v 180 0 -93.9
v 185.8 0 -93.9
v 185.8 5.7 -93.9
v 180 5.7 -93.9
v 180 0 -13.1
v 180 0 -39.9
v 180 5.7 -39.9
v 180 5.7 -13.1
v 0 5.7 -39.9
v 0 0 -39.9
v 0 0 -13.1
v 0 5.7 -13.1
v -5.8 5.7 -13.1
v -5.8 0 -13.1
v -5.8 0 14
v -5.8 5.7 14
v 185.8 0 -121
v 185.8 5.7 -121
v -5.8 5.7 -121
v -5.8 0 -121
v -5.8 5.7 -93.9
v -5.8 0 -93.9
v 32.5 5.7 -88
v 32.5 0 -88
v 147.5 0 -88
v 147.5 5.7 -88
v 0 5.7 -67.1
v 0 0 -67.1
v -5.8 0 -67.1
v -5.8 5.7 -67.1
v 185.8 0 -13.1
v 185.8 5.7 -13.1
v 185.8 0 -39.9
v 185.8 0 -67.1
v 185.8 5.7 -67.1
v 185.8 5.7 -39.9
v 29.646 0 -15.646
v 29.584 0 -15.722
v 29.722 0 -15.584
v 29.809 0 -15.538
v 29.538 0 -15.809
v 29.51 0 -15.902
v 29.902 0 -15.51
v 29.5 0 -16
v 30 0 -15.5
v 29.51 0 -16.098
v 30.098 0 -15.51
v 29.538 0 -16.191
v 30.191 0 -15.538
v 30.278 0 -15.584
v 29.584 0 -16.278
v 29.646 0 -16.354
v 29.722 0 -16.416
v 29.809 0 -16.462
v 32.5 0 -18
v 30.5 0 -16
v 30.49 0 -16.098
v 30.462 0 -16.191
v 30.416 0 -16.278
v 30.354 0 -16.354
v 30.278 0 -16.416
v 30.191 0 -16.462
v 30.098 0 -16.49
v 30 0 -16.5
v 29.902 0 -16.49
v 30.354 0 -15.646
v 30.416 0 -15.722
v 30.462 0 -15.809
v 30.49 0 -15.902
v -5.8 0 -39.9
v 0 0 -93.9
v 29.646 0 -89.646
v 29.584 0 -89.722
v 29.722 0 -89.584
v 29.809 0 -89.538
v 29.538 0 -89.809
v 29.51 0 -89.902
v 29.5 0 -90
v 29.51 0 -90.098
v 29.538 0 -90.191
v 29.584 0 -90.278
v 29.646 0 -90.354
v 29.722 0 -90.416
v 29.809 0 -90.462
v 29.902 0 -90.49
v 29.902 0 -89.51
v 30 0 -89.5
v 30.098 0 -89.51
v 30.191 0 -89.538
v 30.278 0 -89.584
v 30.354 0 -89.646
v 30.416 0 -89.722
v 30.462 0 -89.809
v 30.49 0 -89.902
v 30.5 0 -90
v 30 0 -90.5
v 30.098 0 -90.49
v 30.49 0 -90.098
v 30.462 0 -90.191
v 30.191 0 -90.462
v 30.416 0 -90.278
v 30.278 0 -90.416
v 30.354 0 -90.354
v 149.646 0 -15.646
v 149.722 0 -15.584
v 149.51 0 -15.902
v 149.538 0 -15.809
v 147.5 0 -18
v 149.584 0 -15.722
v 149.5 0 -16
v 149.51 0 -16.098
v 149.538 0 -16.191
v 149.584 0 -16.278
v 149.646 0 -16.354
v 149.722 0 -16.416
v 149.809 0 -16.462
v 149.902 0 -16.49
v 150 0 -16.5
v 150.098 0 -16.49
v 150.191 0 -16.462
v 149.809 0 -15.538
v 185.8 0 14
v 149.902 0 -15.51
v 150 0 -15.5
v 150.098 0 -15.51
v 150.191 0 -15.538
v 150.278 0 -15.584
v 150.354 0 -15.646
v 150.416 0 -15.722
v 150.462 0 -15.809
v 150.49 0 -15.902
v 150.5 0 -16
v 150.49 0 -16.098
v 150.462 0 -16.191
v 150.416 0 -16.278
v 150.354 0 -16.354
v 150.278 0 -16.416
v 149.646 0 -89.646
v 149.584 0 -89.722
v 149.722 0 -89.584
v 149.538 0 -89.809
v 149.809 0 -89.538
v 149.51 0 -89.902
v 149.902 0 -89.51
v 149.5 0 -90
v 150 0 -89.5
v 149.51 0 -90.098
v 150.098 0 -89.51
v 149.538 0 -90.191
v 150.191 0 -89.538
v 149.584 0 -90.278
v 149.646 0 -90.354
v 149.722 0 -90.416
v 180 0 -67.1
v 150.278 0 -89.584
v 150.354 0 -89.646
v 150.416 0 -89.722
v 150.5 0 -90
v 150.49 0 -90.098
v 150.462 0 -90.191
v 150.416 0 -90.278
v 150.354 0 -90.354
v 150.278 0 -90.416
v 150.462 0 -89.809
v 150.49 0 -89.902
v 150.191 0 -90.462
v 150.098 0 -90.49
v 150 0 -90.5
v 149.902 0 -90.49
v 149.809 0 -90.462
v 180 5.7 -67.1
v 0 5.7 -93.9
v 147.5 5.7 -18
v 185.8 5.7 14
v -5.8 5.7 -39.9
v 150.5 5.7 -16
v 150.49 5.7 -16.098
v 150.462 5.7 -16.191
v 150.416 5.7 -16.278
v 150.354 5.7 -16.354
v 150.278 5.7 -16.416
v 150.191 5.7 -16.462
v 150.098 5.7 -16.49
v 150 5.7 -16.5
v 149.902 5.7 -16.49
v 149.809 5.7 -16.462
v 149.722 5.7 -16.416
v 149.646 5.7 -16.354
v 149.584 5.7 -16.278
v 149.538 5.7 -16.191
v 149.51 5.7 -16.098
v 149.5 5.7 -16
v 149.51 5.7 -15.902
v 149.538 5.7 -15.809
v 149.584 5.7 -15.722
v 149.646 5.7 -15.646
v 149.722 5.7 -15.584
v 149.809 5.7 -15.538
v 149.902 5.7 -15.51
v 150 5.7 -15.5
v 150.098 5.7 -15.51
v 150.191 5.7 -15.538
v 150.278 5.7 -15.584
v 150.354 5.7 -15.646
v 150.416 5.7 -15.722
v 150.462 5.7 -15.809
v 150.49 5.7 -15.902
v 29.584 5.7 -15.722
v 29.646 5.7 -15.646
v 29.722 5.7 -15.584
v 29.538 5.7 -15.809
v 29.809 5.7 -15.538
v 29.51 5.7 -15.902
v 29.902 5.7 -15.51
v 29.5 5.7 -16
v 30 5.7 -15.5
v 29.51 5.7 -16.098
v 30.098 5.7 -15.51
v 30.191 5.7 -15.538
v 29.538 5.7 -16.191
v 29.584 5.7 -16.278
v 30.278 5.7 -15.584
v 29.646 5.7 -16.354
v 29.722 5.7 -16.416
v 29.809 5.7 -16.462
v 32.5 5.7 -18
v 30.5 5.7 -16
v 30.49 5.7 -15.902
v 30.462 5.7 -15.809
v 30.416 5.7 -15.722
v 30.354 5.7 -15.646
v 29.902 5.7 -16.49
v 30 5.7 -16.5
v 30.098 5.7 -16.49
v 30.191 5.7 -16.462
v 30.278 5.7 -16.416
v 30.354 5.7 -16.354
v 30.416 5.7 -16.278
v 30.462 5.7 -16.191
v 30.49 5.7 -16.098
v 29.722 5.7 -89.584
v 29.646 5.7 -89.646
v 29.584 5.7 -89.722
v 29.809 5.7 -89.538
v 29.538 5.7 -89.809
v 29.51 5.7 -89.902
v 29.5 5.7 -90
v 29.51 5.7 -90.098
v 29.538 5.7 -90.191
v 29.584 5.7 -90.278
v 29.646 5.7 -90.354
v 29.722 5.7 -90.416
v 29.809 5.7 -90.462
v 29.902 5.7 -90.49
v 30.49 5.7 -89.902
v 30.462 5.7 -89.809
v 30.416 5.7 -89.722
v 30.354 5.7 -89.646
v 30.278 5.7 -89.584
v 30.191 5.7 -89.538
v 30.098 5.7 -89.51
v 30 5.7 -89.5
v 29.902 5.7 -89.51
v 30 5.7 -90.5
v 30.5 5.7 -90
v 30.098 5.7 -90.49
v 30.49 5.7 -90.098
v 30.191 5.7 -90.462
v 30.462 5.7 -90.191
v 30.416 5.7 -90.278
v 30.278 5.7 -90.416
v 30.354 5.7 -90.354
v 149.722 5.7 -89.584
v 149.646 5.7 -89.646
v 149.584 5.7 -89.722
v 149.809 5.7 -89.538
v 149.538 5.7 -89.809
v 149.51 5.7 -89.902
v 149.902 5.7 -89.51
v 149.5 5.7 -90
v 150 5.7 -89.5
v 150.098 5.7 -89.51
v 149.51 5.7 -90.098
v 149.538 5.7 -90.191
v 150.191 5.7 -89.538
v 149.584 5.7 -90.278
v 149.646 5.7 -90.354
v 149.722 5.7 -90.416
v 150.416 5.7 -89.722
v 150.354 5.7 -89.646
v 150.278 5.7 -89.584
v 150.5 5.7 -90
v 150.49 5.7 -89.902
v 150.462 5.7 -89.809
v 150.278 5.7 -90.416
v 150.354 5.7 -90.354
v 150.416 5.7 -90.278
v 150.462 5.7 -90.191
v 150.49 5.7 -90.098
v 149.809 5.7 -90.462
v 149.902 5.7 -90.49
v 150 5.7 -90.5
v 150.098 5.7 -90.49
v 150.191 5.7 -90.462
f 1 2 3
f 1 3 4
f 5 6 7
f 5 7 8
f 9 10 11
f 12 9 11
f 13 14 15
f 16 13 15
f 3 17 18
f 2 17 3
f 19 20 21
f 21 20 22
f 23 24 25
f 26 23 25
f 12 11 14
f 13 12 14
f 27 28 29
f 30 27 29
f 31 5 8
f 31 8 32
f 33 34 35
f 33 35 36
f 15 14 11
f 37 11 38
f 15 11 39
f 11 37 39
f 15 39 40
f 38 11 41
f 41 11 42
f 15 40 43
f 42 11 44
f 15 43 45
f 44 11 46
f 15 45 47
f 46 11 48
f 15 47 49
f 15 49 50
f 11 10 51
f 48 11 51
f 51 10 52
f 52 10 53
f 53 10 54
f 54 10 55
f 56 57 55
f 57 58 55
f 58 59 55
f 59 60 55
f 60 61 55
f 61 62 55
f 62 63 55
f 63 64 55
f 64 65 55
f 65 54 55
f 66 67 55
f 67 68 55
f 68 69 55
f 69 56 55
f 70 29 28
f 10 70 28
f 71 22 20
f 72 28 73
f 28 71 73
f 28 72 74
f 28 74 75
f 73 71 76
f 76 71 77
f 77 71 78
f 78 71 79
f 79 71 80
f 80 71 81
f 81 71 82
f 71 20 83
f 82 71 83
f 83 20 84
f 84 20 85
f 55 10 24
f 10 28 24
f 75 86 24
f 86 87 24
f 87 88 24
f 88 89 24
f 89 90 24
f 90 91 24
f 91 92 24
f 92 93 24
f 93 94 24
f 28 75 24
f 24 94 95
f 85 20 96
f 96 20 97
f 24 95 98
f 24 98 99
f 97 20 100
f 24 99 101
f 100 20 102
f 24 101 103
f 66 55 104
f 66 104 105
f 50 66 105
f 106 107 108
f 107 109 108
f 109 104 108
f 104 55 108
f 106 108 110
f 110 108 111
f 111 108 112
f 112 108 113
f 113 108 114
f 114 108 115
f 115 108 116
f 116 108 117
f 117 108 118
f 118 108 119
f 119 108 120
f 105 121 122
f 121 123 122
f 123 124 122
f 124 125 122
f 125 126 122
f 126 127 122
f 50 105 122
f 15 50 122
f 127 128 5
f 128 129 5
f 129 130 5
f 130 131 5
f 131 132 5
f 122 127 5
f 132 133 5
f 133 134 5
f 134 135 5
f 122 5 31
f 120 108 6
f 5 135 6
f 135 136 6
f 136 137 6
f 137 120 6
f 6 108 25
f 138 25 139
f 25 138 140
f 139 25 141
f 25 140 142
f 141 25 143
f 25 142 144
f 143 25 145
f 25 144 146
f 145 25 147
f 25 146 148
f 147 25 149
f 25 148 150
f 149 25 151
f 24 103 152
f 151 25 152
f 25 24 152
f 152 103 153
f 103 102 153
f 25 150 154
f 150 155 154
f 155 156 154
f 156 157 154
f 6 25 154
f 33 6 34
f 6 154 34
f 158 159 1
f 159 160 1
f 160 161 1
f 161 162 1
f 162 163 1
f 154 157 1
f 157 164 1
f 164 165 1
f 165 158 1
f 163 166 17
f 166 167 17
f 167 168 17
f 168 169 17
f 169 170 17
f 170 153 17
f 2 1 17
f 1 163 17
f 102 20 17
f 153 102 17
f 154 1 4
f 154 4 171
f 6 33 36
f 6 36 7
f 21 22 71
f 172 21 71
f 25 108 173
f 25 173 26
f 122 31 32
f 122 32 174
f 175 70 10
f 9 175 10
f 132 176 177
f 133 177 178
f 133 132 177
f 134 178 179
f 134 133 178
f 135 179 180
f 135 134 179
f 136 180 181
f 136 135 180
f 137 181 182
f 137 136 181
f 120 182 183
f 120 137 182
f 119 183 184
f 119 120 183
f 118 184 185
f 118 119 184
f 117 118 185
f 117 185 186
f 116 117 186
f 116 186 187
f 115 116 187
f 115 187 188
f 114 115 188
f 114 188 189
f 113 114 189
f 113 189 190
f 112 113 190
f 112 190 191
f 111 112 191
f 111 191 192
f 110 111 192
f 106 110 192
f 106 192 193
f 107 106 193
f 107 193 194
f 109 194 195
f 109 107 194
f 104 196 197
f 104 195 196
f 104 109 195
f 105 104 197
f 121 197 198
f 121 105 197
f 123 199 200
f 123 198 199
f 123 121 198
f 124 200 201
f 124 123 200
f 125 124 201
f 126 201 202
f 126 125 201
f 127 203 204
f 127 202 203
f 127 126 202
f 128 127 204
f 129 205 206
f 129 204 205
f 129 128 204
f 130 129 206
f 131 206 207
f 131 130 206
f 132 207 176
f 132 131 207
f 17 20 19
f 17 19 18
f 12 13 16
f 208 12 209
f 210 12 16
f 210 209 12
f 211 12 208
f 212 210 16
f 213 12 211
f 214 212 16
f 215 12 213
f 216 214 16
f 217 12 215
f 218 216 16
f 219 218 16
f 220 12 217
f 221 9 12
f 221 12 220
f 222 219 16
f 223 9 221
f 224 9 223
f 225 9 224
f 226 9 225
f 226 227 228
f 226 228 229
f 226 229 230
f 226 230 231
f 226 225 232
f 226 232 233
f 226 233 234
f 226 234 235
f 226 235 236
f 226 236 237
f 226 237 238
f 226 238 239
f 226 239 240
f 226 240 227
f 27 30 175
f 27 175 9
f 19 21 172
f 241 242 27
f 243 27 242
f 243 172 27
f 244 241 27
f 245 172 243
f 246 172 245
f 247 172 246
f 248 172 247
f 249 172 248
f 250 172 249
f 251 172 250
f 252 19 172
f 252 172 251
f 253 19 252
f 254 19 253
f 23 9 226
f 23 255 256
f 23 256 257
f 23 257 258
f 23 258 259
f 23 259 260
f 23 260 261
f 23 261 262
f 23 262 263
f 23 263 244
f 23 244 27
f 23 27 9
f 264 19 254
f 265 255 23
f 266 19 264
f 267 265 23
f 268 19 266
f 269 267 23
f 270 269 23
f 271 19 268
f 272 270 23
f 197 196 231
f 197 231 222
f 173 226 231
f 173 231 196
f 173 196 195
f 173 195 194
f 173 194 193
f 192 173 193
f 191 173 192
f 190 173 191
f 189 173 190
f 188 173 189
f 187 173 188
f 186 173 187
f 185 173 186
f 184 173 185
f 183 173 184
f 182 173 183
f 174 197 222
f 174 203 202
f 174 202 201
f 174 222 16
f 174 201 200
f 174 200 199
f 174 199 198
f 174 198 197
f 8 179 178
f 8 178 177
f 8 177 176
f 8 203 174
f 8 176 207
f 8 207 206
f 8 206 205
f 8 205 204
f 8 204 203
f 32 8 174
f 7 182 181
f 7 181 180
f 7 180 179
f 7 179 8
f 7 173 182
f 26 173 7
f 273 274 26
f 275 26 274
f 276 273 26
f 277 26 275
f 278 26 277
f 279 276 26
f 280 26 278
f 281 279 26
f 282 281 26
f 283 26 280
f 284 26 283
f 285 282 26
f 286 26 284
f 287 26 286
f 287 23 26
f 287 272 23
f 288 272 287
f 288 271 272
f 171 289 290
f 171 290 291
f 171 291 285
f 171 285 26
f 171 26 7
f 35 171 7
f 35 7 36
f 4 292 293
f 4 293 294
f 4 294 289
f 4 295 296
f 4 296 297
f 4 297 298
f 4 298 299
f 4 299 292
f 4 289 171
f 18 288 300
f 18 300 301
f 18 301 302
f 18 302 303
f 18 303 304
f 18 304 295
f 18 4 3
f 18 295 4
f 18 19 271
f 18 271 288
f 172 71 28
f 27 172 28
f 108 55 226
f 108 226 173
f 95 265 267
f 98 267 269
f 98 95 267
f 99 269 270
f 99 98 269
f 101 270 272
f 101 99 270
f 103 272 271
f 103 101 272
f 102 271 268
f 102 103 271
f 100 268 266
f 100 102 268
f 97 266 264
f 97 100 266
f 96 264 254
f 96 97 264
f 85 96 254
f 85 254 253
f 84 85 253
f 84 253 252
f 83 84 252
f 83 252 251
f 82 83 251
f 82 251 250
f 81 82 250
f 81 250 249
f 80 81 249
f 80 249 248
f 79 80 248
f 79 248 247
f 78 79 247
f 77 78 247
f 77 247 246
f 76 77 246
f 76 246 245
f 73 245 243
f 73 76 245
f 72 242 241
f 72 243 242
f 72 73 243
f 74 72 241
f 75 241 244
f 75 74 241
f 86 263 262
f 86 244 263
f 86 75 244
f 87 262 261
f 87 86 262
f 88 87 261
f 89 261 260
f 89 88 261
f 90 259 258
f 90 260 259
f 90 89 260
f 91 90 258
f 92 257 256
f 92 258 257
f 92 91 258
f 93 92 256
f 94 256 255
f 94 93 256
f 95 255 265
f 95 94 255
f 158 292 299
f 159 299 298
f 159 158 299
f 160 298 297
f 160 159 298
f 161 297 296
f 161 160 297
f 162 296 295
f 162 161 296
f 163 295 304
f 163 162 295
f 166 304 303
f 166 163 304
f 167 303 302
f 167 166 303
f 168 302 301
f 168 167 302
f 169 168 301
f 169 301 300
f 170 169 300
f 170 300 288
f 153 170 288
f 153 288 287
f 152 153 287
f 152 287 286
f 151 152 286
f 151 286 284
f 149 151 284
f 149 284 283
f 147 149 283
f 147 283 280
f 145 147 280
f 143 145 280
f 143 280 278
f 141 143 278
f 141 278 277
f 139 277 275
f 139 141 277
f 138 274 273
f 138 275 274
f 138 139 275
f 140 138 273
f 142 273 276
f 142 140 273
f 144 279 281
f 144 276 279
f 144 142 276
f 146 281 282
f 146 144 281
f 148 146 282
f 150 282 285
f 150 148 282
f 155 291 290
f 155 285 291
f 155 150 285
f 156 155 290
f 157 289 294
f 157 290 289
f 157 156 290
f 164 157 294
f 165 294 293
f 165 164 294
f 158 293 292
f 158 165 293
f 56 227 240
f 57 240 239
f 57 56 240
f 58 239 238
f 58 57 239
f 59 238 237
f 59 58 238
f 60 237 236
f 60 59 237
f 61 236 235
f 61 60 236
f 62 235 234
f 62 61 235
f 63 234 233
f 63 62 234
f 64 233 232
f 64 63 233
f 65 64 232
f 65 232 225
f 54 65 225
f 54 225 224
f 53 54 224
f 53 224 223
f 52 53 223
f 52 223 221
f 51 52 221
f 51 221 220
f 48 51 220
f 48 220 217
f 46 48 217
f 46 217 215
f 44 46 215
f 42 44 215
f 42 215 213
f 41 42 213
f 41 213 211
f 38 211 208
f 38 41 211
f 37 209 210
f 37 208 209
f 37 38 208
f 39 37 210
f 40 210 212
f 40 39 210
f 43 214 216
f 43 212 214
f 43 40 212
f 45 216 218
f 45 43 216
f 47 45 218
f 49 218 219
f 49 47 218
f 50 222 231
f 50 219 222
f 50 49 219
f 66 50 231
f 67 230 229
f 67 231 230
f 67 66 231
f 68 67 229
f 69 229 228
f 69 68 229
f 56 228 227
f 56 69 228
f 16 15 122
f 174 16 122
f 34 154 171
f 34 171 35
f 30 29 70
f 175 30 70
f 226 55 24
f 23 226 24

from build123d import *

# Parameters (mm, degrees)
SKETCH3_W           = 192
SKETCH3_H           = 135
BOSS_EXTRUDE1_DEPTH = 5.7
SKETCH9_W           = 115
SKETCH9_H           = 70
CUT_EXTRUDE2_DEPTH  = 47
SKETCH12_R          = 0.5
CUT_EXTRUDE3_DEPTH  = 37
CUT_EXTRUDE4_DEPTH  = 11


with BuildPart() as part:
    # Sketch3 → Boss-Extrude1 (new body)
    with BuildSketch(Plane(origin=(0, 0, 0), x_dir=(1, 0, 0), z_dir=(0, 1, 0))):
        with Locations((90, 53.5)):
            Rectangle(SKETCH3_W, SKETCH3_H)
    extrude(amount=BOSS_EXTRUDE1_DEPTH)

    # Sketch9 → Cut-Extrude2 (cut)
    with BuildSketch(Plane(origin=(0, 0, 0), x_dir=(1, 0, 0), z_dir=(0, 1, 0))):
        with Locations((90, 53)):
            Rectangle(SKETCH9_W, SKETCH9_H)
    extrude(amount=CUT_EXTRUDE2_DEPTH, mode=Mode.SUBTRACT)

    # Sketch12 → Cut-Extrude3 (cut)
    with BuildSketch(Plane(origin=(0, 0, 0), x_dir=(1, 0, 0), z_dir=(0, 1, 0))):
        with Locations((30, 90)):
            Circle(SKETCH12_R)
        with Locations((30, 16)):
            Circle(SKETCH12_R)
        with Locations((150, 16)):
            Circle(SKETCH12_R)
        with Locations((150, 90)):
            Circle(SKETCH12_R)
    extrude(amount=CUT_EXTRUDE3_DEPTH, mode=Mode.SUBTRACT)

    # Sketch13 → Cut-Extrude4 (cut)
    with BuildSketch(Plane(origin=(0, 0, 0), x_dir=(1, 0, 0), z_dir=(0, 1, 0))):
        Polygon((-5.8, 121), (-5.8, 93.9), (0, 93.9), (0, 67.1), (-5.8, 67.1), (-5.8, 39.9), (0, 39.9), (0, 13.1), (-5.8, 13.1), (-5.8, -14), (-9.8, -14), (-9.8, 121), align=None)
        Polygon((189.8, 121), (185.8, 121), (185.8, 93.9), (180, 93.9), (180, 67.1), (185.8, 67.1), (185.8, 39.9), (180, 39.9), (180, 13.1), (185.8, 13.1), (185.8, -14), (189.8, -14), align=None)
    extrude(amount=CUT_EXTRUDE4_DEPTH, mode=Mode.SUBTRACT)


solid = part.part
